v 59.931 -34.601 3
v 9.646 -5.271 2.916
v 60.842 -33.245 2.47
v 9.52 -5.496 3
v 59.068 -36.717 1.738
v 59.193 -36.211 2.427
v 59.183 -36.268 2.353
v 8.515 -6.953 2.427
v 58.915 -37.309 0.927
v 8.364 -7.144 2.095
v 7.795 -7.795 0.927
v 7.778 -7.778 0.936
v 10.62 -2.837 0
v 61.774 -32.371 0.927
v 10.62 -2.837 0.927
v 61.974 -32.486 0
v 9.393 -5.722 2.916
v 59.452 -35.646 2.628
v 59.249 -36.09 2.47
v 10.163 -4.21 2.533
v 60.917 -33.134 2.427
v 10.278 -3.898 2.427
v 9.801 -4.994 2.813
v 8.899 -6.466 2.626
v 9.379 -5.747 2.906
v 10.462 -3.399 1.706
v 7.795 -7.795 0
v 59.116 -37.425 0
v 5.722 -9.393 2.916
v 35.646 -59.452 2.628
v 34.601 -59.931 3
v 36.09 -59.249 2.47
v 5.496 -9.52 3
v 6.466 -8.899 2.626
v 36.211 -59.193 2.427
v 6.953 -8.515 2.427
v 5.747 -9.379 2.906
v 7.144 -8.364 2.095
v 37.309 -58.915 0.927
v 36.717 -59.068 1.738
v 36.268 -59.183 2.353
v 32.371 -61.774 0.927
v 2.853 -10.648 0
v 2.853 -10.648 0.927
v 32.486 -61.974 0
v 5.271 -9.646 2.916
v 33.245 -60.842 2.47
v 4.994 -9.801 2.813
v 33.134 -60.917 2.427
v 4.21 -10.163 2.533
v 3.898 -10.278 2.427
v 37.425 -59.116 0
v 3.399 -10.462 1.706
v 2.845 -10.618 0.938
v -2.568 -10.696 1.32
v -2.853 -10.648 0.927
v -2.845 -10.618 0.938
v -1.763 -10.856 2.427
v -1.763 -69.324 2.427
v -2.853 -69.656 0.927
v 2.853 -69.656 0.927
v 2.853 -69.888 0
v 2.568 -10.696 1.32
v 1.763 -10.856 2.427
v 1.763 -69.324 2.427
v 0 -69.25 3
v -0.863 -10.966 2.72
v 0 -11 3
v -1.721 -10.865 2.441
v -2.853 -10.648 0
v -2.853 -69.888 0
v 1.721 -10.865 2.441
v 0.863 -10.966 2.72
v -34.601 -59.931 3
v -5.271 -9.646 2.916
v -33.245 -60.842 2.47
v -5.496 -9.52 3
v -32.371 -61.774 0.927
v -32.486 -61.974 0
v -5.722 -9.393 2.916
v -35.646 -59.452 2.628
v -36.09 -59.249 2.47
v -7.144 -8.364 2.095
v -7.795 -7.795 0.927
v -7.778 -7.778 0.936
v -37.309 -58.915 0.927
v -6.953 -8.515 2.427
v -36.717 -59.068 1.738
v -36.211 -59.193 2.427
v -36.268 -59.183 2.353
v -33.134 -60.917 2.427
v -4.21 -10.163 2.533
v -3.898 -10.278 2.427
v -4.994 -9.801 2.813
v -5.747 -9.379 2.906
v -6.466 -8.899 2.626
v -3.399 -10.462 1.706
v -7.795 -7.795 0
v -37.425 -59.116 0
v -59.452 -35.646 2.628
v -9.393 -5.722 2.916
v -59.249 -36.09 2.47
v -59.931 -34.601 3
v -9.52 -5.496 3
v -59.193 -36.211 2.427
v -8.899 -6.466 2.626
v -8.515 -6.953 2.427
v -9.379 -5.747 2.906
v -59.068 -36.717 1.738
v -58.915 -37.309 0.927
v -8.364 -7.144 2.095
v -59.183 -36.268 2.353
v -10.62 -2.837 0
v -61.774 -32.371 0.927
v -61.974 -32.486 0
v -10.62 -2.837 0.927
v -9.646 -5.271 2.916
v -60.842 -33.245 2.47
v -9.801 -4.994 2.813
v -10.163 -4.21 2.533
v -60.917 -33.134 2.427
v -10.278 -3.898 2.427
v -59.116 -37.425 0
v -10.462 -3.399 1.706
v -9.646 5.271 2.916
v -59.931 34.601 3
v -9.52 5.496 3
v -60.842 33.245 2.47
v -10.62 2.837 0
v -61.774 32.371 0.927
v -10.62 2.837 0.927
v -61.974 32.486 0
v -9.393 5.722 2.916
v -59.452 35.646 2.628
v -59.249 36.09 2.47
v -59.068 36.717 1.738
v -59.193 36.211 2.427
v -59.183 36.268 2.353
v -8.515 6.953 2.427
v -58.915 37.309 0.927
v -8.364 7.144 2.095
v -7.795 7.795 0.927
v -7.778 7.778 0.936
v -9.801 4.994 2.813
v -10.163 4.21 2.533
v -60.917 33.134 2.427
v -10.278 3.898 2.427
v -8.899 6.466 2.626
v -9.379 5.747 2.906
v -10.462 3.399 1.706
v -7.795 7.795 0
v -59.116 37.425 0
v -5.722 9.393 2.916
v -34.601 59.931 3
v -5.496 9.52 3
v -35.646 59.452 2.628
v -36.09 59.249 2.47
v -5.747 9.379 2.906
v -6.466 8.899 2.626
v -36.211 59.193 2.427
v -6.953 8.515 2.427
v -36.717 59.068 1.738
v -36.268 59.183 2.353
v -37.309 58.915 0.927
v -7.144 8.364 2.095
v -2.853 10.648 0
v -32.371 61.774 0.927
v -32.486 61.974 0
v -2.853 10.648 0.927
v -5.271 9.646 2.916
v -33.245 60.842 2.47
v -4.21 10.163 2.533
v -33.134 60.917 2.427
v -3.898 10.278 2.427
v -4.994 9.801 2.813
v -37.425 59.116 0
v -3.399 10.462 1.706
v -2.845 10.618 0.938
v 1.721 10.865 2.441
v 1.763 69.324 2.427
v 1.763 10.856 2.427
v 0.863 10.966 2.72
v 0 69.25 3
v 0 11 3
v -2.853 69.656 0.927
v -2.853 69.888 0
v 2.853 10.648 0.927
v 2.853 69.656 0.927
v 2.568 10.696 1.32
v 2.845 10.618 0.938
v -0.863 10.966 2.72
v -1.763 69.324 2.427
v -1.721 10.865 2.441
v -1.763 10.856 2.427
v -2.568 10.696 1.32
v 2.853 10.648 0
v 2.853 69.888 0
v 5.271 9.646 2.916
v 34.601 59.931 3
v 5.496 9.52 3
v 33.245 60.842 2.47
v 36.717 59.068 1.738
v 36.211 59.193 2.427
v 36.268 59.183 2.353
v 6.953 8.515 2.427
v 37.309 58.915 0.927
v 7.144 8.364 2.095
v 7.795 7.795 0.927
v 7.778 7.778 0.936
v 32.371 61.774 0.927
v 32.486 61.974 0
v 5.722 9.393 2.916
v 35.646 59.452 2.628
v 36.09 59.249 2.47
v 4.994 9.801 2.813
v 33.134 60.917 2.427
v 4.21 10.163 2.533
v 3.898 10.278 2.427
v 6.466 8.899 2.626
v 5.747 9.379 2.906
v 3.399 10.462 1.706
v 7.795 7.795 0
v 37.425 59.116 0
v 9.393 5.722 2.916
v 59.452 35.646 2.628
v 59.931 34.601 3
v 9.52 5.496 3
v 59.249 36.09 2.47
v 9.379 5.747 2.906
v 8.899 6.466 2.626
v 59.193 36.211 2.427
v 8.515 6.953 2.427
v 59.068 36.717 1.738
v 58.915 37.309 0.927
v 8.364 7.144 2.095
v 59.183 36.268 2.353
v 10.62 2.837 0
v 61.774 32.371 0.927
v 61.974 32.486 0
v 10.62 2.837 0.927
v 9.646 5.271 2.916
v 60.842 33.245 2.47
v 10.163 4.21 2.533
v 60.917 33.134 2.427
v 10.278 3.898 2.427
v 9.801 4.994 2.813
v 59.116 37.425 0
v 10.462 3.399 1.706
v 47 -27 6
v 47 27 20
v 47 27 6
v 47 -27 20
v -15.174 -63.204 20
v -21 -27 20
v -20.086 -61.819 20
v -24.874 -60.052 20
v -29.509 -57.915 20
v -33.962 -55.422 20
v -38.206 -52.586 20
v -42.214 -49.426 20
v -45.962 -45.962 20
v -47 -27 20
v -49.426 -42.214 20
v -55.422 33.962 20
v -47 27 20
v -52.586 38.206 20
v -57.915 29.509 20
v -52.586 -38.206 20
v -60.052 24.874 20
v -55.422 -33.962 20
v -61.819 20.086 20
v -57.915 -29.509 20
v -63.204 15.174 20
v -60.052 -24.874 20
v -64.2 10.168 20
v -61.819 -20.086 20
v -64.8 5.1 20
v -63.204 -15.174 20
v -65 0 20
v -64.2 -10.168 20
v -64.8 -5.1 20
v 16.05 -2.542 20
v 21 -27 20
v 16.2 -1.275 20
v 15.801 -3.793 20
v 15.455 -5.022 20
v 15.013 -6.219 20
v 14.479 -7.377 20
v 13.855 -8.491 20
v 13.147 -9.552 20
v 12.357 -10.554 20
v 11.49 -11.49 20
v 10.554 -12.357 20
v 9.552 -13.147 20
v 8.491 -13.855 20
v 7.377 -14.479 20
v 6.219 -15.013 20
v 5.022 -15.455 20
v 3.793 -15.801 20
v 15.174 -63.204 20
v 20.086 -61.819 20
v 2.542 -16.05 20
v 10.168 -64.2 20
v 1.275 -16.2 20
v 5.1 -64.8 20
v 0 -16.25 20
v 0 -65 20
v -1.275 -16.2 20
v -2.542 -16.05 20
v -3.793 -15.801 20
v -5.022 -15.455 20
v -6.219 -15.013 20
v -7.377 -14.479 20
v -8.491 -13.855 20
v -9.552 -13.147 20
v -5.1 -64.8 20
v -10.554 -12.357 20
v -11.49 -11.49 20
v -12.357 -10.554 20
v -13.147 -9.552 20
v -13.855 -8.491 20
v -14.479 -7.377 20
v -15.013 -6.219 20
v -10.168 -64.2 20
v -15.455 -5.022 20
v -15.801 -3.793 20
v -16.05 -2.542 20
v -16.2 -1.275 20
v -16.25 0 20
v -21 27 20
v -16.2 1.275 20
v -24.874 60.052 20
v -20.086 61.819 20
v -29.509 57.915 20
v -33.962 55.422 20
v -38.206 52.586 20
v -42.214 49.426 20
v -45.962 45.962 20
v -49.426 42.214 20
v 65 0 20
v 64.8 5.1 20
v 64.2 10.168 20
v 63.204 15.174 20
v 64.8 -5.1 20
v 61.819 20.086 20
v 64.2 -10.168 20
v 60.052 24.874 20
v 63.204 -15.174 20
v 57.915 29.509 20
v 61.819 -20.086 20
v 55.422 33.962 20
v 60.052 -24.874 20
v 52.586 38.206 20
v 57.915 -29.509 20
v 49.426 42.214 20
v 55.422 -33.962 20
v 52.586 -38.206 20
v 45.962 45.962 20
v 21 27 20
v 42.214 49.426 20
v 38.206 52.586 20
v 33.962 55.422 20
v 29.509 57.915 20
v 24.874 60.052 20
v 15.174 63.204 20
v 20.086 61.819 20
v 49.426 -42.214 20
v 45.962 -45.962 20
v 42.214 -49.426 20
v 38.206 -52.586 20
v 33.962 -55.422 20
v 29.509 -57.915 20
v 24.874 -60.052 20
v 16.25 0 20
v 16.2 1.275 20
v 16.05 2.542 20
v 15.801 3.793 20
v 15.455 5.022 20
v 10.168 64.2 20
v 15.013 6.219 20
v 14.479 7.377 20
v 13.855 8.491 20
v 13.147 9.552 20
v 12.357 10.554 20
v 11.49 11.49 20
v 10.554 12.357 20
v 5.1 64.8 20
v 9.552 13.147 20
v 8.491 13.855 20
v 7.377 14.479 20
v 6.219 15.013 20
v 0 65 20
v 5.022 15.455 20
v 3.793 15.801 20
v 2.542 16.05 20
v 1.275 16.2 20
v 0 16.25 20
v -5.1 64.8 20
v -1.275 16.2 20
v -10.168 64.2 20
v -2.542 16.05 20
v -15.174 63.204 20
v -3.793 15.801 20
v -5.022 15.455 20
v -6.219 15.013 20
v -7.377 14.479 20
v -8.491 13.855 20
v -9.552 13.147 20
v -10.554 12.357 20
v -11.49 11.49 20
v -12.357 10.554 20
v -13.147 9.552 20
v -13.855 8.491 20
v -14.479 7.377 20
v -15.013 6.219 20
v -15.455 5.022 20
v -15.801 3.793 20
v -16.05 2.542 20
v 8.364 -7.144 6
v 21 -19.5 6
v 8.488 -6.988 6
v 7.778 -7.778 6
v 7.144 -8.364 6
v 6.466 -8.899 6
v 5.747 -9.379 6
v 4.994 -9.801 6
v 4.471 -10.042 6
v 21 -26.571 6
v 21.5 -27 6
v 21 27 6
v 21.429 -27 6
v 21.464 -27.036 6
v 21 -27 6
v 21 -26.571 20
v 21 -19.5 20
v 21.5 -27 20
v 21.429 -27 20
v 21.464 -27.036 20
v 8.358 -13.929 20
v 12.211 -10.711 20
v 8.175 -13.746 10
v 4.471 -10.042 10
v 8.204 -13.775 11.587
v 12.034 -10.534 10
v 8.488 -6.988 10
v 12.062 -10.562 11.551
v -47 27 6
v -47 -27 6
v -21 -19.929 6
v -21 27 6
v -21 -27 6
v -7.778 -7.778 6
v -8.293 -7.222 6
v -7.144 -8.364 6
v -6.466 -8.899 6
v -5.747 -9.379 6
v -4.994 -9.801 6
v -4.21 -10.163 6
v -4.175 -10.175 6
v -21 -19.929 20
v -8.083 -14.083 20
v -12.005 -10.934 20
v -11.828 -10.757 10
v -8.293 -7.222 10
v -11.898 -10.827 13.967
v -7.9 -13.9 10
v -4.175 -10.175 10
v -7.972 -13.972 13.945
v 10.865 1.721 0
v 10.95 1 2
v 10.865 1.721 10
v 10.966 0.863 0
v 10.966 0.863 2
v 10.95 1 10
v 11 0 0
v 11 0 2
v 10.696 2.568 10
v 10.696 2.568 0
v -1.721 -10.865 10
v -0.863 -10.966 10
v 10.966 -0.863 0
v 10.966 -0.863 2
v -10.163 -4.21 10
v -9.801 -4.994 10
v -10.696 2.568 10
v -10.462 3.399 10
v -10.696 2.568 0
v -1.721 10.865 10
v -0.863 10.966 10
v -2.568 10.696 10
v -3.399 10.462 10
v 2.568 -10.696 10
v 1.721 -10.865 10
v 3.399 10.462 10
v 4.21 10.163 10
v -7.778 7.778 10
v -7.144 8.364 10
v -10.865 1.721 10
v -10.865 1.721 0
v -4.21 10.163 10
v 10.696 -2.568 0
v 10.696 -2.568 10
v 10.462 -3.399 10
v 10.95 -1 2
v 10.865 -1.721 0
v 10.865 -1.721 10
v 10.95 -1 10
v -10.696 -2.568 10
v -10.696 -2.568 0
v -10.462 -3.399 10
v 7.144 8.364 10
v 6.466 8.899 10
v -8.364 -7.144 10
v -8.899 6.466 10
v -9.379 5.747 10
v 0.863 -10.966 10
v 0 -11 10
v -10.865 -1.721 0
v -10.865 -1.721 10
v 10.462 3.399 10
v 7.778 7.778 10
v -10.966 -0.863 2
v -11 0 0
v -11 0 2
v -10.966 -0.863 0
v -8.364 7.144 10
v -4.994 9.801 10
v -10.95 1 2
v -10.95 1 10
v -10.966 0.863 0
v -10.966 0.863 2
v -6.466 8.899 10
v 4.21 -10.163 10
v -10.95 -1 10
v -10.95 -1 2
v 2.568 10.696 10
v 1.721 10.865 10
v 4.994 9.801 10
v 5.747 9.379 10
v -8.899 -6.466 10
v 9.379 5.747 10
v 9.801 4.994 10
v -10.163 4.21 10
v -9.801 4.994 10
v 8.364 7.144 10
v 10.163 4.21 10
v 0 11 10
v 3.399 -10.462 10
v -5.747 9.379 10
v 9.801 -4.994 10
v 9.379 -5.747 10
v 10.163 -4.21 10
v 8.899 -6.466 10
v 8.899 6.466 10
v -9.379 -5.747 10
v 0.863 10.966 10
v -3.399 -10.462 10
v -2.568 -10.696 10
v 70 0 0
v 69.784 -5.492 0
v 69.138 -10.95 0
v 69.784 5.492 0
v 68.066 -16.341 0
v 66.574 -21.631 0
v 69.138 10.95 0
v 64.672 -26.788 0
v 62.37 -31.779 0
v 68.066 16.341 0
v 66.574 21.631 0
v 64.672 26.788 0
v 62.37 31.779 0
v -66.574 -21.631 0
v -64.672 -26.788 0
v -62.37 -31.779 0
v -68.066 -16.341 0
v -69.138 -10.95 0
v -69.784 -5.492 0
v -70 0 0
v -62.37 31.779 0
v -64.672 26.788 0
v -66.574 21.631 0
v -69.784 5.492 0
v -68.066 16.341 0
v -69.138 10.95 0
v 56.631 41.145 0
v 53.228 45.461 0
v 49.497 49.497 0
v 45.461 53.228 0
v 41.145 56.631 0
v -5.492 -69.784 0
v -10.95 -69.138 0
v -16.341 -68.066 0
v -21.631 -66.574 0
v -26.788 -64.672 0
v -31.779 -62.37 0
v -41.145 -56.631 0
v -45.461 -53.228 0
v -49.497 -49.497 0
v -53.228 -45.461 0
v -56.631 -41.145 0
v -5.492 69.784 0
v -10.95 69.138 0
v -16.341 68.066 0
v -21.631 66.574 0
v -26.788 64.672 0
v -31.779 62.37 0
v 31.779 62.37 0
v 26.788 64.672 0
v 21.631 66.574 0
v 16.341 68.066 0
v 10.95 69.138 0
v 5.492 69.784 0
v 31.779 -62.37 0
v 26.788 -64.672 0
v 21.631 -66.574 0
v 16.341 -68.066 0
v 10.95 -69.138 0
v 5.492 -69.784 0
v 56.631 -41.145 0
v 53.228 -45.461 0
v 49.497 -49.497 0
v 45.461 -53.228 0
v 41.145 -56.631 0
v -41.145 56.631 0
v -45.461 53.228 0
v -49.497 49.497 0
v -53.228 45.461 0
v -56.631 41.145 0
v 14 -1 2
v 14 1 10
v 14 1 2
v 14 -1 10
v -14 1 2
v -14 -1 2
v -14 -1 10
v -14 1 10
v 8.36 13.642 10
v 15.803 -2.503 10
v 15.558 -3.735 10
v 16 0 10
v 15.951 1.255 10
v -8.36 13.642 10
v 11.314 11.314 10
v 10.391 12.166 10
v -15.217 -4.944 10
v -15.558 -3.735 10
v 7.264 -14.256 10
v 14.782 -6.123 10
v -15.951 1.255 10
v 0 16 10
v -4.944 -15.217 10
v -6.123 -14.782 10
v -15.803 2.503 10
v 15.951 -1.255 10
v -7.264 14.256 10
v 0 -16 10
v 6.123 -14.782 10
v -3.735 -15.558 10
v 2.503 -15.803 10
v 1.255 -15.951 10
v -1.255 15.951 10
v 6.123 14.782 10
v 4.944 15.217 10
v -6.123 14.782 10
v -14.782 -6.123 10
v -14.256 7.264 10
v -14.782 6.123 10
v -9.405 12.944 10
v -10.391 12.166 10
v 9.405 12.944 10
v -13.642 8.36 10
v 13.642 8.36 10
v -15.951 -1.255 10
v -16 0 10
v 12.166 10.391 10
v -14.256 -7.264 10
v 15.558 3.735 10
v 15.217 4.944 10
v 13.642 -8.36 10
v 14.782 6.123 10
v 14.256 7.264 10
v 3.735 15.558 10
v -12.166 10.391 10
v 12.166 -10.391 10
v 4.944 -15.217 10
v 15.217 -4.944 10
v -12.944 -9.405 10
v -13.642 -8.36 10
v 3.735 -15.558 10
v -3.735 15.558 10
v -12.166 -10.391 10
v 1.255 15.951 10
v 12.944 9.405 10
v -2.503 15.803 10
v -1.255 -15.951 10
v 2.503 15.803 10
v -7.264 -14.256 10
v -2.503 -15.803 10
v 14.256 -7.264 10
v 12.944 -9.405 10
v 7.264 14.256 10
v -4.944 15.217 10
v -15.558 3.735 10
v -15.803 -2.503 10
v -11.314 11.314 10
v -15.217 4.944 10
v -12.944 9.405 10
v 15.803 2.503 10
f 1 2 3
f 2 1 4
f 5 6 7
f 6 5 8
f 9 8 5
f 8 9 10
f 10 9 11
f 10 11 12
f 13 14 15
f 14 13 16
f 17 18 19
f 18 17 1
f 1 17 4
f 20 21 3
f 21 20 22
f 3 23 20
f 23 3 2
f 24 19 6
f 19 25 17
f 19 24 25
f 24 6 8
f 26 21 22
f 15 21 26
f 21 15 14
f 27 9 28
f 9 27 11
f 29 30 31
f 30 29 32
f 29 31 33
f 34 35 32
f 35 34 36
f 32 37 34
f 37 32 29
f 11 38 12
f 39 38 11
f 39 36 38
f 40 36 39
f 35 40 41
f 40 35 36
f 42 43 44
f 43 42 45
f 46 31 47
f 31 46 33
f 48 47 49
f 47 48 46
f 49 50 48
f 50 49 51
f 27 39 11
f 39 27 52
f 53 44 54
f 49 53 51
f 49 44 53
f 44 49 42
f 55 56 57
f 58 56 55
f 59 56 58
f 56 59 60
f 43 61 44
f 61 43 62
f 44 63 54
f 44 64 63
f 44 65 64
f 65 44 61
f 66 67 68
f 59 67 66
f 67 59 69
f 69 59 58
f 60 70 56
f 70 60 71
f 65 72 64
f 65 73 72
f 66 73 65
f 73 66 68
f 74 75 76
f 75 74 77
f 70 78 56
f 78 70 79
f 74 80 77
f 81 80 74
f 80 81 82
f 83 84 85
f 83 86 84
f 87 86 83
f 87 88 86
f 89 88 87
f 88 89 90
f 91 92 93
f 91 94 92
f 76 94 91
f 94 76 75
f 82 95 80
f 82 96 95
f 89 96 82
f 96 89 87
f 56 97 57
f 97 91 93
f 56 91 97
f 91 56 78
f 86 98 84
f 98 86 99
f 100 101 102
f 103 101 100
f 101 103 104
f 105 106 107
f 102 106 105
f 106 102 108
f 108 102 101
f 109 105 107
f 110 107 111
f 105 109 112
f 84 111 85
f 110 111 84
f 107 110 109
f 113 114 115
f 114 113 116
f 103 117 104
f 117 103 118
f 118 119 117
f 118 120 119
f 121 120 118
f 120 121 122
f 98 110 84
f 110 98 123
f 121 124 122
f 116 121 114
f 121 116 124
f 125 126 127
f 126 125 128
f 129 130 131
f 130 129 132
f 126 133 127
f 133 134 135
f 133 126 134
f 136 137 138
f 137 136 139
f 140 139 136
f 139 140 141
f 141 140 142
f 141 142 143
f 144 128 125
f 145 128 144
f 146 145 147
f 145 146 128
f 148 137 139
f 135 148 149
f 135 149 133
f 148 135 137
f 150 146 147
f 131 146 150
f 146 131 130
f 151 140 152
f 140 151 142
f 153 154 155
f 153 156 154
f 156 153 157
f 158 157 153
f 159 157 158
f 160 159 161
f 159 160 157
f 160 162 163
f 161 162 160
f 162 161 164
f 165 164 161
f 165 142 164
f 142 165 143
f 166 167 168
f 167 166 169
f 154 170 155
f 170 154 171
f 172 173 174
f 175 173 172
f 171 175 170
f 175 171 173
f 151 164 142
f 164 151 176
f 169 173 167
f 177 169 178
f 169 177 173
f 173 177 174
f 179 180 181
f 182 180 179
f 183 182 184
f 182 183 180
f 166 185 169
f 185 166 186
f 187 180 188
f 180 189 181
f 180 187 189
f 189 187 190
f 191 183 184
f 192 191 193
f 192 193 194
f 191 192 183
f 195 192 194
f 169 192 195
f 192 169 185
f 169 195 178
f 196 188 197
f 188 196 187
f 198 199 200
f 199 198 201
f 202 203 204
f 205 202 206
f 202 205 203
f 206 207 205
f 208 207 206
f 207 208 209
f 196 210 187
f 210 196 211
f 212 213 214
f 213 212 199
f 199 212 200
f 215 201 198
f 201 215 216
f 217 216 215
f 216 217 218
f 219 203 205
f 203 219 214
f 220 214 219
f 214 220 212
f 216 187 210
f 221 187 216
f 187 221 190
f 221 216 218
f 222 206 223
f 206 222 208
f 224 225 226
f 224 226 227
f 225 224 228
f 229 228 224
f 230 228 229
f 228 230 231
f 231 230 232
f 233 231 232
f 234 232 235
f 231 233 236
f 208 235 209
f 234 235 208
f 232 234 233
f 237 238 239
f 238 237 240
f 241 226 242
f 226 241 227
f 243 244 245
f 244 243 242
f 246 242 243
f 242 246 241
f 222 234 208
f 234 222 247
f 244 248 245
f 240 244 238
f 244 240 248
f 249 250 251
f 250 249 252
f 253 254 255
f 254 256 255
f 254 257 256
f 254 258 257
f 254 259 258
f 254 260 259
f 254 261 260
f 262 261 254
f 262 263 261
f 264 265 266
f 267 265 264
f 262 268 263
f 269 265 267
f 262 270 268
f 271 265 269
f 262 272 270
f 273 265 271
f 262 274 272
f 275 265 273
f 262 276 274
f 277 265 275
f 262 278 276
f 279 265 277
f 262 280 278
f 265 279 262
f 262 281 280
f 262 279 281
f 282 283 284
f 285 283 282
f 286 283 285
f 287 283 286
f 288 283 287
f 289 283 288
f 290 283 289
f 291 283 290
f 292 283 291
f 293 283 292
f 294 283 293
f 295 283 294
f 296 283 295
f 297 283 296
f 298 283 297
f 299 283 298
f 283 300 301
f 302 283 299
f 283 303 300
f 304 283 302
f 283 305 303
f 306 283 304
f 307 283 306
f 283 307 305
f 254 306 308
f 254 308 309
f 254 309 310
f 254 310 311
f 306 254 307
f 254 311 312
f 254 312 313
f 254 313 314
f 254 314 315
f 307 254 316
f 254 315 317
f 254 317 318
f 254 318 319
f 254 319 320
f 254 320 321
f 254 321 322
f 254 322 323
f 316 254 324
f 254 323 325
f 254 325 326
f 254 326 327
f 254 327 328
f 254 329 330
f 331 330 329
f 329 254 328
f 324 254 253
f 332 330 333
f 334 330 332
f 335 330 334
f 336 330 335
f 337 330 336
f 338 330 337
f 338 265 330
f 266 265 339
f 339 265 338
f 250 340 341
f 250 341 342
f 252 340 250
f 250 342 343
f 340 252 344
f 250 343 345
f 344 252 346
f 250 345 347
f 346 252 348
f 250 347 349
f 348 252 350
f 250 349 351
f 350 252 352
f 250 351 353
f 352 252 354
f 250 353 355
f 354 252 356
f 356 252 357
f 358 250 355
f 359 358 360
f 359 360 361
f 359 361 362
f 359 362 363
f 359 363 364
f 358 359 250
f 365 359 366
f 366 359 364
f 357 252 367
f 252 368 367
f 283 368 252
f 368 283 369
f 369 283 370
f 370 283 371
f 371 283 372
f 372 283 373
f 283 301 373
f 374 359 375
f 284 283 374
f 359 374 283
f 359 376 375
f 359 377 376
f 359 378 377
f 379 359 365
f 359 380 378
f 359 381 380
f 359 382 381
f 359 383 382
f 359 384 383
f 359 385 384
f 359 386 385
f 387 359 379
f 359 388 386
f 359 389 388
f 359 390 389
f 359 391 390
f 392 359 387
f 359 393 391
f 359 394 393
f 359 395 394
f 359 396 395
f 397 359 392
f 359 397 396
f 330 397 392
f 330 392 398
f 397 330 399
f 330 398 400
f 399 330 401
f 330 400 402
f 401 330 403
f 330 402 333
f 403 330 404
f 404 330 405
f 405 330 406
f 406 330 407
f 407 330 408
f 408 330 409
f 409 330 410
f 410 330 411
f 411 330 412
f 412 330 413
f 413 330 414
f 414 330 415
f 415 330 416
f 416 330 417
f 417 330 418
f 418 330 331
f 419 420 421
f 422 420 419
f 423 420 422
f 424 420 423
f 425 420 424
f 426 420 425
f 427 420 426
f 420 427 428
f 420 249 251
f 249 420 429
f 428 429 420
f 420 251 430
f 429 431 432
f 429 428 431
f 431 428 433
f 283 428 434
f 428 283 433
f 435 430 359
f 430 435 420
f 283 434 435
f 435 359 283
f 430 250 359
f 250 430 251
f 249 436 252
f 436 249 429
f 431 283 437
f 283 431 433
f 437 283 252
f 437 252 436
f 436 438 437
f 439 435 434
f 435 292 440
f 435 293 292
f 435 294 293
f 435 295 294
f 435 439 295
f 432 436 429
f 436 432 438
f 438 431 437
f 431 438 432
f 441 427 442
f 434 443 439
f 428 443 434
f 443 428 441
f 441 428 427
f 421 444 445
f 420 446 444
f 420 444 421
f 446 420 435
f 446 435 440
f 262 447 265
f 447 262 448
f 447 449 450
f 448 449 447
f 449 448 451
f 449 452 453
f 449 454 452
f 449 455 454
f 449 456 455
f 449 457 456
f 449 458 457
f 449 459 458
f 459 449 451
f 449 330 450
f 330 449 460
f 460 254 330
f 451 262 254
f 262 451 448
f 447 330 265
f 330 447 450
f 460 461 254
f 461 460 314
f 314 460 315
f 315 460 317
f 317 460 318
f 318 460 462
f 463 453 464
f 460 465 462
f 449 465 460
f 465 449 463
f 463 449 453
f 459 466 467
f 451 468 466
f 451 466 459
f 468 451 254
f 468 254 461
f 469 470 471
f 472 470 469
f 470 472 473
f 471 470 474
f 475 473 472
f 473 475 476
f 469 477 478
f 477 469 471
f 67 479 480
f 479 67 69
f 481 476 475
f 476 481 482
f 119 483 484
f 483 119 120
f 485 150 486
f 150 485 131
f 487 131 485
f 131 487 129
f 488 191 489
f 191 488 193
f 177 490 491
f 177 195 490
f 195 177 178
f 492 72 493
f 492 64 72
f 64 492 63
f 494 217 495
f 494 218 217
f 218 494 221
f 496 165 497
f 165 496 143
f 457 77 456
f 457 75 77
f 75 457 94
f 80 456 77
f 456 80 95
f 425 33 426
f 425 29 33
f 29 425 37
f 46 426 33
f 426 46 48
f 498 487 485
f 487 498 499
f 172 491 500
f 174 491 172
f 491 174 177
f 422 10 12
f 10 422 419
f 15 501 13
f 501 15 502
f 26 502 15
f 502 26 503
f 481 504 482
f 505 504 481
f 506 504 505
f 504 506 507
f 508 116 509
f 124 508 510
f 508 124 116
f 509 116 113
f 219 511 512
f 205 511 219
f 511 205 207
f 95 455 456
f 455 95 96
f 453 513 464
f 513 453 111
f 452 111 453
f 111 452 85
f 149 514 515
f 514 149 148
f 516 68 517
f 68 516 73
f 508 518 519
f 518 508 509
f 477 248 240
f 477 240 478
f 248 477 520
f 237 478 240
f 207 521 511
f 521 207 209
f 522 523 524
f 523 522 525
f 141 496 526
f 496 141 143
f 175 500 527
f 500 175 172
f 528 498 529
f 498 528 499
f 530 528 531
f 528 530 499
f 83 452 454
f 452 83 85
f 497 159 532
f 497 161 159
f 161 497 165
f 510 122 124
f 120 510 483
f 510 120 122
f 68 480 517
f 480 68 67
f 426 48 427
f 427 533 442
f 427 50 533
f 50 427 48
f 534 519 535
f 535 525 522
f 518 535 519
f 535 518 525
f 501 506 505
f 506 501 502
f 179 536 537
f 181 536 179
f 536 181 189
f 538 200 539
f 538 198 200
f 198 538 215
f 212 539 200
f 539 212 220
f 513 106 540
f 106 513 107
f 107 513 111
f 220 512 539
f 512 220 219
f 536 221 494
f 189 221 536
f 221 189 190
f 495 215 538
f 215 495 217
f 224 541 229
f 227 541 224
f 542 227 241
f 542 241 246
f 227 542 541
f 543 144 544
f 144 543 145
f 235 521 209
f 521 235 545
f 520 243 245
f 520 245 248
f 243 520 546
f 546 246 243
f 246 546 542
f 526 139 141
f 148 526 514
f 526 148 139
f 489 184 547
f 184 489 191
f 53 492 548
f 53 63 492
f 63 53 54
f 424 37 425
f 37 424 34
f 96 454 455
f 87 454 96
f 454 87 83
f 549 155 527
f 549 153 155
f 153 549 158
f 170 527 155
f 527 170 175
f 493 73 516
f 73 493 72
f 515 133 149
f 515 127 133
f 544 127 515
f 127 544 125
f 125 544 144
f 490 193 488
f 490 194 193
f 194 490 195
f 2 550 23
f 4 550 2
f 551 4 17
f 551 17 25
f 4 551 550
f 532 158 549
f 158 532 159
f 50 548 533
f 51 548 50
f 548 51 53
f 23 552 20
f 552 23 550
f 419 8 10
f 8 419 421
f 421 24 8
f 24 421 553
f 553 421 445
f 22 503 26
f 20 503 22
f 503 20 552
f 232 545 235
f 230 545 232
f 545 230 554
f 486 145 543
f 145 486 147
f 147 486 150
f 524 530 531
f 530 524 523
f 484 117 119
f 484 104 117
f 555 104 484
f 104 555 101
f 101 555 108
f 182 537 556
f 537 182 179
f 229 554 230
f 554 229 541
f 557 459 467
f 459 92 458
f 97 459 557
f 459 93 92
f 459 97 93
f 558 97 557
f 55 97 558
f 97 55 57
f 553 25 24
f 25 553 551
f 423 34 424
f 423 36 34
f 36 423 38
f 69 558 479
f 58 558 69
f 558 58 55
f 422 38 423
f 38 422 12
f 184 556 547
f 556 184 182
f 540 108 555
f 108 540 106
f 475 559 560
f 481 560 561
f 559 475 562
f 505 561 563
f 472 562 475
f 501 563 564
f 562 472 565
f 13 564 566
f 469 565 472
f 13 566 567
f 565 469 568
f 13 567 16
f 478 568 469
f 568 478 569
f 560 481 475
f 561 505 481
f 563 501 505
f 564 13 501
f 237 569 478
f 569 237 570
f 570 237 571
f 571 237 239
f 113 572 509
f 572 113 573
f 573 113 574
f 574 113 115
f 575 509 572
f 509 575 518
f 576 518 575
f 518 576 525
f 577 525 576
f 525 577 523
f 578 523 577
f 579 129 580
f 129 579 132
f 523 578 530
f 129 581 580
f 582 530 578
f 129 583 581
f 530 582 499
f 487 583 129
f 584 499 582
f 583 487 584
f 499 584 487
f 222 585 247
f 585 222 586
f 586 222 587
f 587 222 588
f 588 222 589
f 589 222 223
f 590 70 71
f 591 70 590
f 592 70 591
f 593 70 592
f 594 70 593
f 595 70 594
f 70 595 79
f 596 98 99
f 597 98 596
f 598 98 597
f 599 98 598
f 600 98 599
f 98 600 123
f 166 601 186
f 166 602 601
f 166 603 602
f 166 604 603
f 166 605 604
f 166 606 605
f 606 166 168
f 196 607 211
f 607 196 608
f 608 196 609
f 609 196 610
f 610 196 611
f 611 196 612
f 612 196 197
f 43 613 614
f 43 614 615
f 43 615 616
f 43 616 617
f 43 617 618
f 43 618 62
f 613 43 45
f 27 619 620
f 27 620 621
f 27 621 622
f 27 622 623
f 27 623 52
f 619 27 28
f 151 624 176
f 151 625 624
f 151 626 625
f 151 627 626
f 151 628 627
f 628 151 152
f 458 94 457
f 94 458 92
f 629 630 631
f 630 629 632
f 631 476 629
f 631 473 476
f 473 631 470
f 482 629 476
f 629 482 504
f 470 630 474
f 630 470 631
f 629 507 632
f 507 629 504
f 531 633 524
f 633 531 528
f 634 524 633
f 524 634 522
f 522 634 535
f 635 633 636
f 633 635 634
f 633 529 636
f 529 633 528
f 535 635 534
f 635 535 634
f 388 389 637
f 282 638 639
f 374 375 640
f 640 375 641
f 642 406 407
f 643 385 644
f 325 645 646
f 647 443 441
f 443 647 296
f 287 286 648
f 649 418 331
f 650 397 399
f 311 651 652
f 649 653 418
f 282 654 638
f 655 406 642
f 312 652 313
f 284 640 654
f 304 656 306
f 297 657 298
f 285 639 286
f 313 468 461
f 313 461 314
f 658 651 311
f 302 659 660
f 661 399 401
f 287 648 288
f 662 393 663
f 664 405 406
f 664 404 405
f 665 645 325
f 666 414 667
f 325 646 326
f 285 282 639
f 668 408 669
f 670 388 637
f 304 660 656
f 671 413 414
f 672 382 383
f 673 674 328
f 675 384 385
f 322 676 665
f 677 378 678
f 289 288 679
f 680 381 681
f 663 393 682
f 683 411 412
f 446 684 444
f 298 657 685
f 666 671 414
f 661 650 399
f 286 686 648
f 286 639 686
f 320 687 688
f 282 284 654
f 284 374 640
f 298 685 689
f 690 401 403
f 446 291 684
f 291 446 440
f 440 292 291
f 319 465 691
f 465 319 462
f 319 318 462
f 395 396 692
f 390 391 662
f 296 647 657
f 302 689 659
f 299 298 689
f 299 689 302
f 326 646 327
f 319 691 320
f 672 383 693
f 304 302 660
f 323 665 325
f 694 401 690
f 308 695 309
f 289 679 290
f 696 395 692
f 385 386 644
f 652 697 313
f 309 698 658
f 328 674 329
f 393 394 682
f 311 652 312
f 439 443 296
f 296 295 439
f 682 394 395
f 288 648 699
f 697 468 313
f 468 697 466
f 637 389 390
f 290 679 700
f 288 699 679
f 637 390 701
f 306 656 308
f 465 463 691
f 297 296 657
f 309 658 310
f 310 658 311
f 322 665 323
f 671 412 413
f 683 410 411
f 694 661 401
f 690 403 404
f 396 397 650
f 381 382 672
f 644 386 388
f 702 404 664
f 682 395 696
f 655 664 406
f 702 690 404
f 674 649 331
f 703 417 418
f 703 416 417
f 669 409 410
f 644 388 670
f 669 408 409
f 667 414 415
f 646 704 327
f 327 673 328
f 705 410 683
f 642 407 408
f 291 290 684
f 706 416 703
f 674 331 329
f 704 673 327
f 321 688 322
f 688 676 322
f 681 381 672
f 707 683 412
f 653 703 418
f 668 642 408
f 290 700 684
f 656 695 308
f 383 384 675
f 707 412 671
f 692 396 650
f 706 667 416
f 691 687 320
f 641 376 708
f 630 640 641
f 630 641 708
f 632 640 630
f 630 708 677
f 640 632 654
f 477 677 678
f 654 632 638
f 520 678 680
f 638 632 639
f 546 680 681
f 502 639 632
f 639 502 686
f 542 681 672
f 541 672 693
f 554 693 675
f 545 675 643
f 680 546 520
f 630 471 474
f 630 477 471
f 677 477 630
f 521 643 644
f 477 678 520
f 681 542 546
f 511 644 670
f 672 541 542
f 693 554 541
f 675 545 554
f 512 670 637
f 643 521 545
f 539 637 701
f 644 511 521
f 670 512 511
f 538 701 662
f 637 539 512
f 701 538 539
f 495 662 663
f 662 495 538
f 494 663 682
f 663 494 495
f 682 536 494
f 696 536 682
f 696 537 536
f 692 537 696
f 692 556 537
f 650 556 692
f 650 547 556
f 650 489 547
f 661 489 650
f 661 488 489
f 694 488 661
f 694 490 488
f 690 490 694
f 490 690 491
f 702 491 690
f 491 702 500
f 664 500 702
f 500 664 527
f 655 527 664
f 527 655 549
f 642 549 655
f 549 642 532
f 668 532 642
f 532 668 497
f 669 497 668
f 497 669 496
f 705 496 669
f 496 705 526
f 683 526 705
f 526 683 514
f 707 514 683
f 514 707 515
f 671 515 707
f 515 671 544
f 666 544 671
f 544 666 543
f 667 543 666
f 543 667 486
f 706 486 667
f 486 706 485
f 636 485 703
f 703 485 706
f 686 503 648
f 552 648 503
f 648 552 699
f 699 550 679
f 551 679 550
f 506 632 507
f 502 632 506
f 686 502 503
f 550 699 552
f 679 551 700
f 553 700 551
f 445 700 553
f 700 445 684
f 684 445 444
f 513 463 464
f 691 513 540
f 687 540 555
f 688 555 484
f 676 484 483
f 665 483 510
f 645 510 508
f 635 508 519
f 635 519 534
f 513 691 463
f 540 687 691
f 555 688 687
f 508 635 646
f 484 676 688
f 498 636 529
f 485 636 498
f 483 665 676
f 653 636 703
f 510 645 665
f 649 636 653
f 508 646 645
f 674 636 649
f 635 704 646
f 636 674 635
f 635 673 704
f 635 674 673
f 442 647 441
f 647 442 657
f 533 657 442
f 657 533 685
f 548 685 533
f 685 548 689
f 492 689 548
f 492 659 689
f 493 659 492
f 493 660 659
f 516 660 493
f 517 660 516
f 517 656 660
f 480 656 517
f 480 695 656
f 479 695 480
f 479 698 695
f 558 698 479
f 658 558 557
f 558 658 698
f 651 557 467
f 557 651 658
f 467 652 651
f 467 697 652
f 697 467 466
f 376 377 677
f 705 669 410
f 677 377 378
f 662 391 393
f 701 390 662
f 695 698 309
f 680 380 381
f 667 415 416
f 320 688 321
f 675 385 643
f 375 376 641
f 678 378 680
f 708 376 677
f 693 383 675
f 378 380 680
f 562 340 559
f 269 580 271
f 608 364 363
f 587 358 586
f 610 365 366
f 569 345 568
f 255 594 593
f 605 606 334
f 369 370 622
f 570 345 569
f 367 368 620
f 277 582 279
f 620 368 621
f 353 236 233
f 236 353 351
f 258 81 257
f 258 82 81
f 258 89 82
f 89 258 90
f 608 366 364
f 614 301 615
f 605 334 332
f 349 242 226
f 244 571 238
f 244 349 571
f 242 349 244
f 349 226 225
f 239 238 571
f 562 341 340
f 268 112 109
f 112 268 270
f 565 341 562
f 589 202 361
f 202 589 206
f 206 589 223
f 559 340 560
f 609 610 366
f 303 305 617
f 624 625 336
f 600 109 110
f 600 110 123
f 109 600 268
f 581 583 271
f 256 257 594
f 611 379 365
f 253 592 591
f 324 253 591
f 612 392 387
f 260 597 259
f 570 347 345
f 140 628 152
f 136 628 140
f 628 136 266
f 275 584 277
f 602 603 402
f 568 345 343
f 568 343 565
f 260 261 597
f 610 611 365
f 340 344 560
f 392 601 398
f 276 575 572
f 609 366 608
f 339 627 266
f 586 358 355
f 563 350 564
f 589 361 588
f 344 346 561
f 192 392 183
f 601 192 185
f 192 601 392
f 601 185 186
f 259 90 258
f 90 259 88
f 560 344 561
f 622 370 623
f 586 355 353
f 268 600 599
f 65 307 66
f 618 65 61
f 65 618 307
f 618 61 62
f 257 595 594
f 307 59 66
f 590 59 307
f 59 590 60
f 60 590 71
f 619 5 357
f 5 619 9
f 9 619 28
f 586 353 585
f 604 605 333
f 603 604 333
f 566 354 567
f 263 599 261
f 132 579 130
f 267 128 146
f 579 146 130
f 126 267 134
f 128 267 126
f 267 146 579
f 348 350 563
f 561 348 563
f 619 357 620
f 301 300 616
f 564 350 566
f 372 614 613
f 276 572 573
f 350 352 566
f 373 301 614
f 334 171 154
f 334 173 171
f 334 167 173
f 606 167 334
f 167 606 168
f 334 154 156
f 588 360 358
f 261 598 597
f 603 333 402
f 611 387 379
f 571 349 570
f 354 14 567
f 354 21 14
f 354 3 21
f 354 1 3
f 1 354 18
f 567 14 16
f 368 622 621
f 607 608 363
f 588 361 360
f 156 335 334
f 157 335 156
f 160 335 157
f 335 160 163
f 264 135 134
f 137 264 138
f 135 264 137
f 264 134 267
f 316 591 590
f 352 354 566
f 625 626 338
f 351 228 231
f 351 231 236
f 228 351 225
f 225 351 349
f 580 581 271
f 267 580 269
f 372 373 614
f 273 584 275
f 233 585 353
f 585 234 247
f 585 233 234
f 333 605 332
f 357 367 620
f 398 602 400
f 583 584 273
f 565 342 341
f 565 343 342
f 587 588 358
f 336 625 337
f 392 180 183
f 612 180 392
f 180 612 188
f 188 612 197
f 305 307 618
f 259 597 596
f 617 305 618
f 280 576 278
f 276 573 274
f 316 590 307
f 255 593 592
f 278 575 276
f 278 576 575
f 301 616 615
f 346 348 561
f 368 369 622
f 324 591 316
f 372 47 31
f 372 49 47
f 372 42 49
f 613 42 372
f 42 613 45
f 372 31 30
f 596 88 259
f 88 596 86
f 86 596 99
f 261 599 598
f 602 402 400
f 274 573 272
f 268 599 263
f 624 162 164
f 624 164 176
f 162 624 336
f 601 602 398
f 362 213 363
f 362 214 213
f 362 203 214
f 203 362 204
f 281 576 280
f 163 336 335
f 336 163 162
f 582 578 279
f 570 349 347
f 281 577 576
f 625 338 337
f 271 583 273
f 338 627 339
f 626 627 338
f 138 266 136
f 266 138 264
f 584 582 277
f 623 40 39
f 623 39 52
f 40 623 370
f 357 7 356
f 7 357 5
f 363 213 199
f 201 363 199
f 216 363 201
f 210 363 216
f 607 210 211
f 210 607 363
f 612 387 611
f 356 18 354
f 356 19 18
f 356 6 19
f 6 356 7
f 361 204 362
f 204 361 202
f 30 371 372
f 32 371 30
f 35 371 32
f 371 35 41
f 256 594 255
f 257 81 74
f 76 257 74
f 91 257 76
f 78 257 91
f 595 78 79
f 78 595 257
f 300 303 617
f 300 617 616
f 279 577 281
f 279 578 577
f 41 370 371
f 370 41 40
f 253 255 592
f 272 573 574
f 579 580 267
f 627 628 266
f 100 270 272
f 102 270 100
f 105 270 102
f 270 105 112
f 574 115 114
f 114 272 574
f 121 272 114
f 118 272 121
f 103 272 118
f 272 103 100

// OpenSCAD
// The height of the base.
baseHeight = 20;
baseRadius = 65; 

// Size of the clear acrylic tube
tubeSize = 32; 
// How far down into the base the tube is expected to go
tubeDepthInBase = baseHeight - 10;

// LiPol cell
//batteryBoxWidth = 37; 
//batteryBoxLength = 54;
//batteryBoxDepth = 13;

// AAA battery.
batteryBoxWidth = 26;
batteryBoxLength = 54;
batteryBoxDepth = 14;



// series of releafes in the base to allow water to run through
// for the water detection part
module waterHoles() {
    for (angle = [30 : 30 : 150]) {
        rotate(a=[angle,90,0]) {
            cylinder(d=6, h=baseRadius+10);
        }
    }
    
    for (angle = [210 : 30 : 330]) {
        rotate(a=[angle,90,0]) {
            cylinder(d=6, h=baseRadius+10);
        }
    }  
}

module batteryCompartment(isTop) {
    translate([(tubeSize/2)+5,-(batteryBoxLength/2), (baseHeight-batteryBoxDepth)]) {
        cube([batteryBoxWidth,batteryBoxLength,batteryBoxDepth]);
        translate([-23,0,0]) {
            //cube([24,5,batteryBoxDepth]);
            translate([0,0,-1]) {
                //cube([5,16,batteryBoxDepth+1]);
            }
        }
        
        if (isTop) {
            translate([4,3.5,0]) {
                rotate(a=135) {
                    cube([28,5,batteryBoxDepth]);
                }
            }
        } else {
            
            translate([0,batteryBoxLength,0]) {
                rotate(a=225) {
                    cube([28,5,batteryBoxDepth]);
                }
            }
        }
    }
}

module base() {
    difference() {
        union() {
            cylinder(r1=baseRadius+5, r2=baseRadius, h=baseHeight, $fn=80);
        }
        union() {
            waterHoles();
            
            batteryCompartment(true);
            
            rotate(a=180) {
                batteryCompartment(false);
            }
            
            // Small inner hole all the way through
            // diameter to match the PCB narrow width used for the 
            // water sensor.
            cylinder(d=22, h=baseHeight, $fn=80);
            
            // 2 vertical pockets for the PCB to rest into.
            translate([10,-1,2]) {
                #cube([4,2,baseHeight]);
            }
            translate([-14,-1,2]) {
                #cube([4,2,baseHeight]);
            }
            
            // tube stops before the bottom of the base
            // Move up so the tube comes through the top of the base
            translate([0,0,baseHeight - tubeDepthInBase]) {
                // Slight angle to give it an easy in and snug fit.
                cylinder(d1=tubeSize, d2 = tubeSize+0.5, h=tubeDepthInBase, $fn=80);
            }
        }
    }
}


base();
//waterHoles();
